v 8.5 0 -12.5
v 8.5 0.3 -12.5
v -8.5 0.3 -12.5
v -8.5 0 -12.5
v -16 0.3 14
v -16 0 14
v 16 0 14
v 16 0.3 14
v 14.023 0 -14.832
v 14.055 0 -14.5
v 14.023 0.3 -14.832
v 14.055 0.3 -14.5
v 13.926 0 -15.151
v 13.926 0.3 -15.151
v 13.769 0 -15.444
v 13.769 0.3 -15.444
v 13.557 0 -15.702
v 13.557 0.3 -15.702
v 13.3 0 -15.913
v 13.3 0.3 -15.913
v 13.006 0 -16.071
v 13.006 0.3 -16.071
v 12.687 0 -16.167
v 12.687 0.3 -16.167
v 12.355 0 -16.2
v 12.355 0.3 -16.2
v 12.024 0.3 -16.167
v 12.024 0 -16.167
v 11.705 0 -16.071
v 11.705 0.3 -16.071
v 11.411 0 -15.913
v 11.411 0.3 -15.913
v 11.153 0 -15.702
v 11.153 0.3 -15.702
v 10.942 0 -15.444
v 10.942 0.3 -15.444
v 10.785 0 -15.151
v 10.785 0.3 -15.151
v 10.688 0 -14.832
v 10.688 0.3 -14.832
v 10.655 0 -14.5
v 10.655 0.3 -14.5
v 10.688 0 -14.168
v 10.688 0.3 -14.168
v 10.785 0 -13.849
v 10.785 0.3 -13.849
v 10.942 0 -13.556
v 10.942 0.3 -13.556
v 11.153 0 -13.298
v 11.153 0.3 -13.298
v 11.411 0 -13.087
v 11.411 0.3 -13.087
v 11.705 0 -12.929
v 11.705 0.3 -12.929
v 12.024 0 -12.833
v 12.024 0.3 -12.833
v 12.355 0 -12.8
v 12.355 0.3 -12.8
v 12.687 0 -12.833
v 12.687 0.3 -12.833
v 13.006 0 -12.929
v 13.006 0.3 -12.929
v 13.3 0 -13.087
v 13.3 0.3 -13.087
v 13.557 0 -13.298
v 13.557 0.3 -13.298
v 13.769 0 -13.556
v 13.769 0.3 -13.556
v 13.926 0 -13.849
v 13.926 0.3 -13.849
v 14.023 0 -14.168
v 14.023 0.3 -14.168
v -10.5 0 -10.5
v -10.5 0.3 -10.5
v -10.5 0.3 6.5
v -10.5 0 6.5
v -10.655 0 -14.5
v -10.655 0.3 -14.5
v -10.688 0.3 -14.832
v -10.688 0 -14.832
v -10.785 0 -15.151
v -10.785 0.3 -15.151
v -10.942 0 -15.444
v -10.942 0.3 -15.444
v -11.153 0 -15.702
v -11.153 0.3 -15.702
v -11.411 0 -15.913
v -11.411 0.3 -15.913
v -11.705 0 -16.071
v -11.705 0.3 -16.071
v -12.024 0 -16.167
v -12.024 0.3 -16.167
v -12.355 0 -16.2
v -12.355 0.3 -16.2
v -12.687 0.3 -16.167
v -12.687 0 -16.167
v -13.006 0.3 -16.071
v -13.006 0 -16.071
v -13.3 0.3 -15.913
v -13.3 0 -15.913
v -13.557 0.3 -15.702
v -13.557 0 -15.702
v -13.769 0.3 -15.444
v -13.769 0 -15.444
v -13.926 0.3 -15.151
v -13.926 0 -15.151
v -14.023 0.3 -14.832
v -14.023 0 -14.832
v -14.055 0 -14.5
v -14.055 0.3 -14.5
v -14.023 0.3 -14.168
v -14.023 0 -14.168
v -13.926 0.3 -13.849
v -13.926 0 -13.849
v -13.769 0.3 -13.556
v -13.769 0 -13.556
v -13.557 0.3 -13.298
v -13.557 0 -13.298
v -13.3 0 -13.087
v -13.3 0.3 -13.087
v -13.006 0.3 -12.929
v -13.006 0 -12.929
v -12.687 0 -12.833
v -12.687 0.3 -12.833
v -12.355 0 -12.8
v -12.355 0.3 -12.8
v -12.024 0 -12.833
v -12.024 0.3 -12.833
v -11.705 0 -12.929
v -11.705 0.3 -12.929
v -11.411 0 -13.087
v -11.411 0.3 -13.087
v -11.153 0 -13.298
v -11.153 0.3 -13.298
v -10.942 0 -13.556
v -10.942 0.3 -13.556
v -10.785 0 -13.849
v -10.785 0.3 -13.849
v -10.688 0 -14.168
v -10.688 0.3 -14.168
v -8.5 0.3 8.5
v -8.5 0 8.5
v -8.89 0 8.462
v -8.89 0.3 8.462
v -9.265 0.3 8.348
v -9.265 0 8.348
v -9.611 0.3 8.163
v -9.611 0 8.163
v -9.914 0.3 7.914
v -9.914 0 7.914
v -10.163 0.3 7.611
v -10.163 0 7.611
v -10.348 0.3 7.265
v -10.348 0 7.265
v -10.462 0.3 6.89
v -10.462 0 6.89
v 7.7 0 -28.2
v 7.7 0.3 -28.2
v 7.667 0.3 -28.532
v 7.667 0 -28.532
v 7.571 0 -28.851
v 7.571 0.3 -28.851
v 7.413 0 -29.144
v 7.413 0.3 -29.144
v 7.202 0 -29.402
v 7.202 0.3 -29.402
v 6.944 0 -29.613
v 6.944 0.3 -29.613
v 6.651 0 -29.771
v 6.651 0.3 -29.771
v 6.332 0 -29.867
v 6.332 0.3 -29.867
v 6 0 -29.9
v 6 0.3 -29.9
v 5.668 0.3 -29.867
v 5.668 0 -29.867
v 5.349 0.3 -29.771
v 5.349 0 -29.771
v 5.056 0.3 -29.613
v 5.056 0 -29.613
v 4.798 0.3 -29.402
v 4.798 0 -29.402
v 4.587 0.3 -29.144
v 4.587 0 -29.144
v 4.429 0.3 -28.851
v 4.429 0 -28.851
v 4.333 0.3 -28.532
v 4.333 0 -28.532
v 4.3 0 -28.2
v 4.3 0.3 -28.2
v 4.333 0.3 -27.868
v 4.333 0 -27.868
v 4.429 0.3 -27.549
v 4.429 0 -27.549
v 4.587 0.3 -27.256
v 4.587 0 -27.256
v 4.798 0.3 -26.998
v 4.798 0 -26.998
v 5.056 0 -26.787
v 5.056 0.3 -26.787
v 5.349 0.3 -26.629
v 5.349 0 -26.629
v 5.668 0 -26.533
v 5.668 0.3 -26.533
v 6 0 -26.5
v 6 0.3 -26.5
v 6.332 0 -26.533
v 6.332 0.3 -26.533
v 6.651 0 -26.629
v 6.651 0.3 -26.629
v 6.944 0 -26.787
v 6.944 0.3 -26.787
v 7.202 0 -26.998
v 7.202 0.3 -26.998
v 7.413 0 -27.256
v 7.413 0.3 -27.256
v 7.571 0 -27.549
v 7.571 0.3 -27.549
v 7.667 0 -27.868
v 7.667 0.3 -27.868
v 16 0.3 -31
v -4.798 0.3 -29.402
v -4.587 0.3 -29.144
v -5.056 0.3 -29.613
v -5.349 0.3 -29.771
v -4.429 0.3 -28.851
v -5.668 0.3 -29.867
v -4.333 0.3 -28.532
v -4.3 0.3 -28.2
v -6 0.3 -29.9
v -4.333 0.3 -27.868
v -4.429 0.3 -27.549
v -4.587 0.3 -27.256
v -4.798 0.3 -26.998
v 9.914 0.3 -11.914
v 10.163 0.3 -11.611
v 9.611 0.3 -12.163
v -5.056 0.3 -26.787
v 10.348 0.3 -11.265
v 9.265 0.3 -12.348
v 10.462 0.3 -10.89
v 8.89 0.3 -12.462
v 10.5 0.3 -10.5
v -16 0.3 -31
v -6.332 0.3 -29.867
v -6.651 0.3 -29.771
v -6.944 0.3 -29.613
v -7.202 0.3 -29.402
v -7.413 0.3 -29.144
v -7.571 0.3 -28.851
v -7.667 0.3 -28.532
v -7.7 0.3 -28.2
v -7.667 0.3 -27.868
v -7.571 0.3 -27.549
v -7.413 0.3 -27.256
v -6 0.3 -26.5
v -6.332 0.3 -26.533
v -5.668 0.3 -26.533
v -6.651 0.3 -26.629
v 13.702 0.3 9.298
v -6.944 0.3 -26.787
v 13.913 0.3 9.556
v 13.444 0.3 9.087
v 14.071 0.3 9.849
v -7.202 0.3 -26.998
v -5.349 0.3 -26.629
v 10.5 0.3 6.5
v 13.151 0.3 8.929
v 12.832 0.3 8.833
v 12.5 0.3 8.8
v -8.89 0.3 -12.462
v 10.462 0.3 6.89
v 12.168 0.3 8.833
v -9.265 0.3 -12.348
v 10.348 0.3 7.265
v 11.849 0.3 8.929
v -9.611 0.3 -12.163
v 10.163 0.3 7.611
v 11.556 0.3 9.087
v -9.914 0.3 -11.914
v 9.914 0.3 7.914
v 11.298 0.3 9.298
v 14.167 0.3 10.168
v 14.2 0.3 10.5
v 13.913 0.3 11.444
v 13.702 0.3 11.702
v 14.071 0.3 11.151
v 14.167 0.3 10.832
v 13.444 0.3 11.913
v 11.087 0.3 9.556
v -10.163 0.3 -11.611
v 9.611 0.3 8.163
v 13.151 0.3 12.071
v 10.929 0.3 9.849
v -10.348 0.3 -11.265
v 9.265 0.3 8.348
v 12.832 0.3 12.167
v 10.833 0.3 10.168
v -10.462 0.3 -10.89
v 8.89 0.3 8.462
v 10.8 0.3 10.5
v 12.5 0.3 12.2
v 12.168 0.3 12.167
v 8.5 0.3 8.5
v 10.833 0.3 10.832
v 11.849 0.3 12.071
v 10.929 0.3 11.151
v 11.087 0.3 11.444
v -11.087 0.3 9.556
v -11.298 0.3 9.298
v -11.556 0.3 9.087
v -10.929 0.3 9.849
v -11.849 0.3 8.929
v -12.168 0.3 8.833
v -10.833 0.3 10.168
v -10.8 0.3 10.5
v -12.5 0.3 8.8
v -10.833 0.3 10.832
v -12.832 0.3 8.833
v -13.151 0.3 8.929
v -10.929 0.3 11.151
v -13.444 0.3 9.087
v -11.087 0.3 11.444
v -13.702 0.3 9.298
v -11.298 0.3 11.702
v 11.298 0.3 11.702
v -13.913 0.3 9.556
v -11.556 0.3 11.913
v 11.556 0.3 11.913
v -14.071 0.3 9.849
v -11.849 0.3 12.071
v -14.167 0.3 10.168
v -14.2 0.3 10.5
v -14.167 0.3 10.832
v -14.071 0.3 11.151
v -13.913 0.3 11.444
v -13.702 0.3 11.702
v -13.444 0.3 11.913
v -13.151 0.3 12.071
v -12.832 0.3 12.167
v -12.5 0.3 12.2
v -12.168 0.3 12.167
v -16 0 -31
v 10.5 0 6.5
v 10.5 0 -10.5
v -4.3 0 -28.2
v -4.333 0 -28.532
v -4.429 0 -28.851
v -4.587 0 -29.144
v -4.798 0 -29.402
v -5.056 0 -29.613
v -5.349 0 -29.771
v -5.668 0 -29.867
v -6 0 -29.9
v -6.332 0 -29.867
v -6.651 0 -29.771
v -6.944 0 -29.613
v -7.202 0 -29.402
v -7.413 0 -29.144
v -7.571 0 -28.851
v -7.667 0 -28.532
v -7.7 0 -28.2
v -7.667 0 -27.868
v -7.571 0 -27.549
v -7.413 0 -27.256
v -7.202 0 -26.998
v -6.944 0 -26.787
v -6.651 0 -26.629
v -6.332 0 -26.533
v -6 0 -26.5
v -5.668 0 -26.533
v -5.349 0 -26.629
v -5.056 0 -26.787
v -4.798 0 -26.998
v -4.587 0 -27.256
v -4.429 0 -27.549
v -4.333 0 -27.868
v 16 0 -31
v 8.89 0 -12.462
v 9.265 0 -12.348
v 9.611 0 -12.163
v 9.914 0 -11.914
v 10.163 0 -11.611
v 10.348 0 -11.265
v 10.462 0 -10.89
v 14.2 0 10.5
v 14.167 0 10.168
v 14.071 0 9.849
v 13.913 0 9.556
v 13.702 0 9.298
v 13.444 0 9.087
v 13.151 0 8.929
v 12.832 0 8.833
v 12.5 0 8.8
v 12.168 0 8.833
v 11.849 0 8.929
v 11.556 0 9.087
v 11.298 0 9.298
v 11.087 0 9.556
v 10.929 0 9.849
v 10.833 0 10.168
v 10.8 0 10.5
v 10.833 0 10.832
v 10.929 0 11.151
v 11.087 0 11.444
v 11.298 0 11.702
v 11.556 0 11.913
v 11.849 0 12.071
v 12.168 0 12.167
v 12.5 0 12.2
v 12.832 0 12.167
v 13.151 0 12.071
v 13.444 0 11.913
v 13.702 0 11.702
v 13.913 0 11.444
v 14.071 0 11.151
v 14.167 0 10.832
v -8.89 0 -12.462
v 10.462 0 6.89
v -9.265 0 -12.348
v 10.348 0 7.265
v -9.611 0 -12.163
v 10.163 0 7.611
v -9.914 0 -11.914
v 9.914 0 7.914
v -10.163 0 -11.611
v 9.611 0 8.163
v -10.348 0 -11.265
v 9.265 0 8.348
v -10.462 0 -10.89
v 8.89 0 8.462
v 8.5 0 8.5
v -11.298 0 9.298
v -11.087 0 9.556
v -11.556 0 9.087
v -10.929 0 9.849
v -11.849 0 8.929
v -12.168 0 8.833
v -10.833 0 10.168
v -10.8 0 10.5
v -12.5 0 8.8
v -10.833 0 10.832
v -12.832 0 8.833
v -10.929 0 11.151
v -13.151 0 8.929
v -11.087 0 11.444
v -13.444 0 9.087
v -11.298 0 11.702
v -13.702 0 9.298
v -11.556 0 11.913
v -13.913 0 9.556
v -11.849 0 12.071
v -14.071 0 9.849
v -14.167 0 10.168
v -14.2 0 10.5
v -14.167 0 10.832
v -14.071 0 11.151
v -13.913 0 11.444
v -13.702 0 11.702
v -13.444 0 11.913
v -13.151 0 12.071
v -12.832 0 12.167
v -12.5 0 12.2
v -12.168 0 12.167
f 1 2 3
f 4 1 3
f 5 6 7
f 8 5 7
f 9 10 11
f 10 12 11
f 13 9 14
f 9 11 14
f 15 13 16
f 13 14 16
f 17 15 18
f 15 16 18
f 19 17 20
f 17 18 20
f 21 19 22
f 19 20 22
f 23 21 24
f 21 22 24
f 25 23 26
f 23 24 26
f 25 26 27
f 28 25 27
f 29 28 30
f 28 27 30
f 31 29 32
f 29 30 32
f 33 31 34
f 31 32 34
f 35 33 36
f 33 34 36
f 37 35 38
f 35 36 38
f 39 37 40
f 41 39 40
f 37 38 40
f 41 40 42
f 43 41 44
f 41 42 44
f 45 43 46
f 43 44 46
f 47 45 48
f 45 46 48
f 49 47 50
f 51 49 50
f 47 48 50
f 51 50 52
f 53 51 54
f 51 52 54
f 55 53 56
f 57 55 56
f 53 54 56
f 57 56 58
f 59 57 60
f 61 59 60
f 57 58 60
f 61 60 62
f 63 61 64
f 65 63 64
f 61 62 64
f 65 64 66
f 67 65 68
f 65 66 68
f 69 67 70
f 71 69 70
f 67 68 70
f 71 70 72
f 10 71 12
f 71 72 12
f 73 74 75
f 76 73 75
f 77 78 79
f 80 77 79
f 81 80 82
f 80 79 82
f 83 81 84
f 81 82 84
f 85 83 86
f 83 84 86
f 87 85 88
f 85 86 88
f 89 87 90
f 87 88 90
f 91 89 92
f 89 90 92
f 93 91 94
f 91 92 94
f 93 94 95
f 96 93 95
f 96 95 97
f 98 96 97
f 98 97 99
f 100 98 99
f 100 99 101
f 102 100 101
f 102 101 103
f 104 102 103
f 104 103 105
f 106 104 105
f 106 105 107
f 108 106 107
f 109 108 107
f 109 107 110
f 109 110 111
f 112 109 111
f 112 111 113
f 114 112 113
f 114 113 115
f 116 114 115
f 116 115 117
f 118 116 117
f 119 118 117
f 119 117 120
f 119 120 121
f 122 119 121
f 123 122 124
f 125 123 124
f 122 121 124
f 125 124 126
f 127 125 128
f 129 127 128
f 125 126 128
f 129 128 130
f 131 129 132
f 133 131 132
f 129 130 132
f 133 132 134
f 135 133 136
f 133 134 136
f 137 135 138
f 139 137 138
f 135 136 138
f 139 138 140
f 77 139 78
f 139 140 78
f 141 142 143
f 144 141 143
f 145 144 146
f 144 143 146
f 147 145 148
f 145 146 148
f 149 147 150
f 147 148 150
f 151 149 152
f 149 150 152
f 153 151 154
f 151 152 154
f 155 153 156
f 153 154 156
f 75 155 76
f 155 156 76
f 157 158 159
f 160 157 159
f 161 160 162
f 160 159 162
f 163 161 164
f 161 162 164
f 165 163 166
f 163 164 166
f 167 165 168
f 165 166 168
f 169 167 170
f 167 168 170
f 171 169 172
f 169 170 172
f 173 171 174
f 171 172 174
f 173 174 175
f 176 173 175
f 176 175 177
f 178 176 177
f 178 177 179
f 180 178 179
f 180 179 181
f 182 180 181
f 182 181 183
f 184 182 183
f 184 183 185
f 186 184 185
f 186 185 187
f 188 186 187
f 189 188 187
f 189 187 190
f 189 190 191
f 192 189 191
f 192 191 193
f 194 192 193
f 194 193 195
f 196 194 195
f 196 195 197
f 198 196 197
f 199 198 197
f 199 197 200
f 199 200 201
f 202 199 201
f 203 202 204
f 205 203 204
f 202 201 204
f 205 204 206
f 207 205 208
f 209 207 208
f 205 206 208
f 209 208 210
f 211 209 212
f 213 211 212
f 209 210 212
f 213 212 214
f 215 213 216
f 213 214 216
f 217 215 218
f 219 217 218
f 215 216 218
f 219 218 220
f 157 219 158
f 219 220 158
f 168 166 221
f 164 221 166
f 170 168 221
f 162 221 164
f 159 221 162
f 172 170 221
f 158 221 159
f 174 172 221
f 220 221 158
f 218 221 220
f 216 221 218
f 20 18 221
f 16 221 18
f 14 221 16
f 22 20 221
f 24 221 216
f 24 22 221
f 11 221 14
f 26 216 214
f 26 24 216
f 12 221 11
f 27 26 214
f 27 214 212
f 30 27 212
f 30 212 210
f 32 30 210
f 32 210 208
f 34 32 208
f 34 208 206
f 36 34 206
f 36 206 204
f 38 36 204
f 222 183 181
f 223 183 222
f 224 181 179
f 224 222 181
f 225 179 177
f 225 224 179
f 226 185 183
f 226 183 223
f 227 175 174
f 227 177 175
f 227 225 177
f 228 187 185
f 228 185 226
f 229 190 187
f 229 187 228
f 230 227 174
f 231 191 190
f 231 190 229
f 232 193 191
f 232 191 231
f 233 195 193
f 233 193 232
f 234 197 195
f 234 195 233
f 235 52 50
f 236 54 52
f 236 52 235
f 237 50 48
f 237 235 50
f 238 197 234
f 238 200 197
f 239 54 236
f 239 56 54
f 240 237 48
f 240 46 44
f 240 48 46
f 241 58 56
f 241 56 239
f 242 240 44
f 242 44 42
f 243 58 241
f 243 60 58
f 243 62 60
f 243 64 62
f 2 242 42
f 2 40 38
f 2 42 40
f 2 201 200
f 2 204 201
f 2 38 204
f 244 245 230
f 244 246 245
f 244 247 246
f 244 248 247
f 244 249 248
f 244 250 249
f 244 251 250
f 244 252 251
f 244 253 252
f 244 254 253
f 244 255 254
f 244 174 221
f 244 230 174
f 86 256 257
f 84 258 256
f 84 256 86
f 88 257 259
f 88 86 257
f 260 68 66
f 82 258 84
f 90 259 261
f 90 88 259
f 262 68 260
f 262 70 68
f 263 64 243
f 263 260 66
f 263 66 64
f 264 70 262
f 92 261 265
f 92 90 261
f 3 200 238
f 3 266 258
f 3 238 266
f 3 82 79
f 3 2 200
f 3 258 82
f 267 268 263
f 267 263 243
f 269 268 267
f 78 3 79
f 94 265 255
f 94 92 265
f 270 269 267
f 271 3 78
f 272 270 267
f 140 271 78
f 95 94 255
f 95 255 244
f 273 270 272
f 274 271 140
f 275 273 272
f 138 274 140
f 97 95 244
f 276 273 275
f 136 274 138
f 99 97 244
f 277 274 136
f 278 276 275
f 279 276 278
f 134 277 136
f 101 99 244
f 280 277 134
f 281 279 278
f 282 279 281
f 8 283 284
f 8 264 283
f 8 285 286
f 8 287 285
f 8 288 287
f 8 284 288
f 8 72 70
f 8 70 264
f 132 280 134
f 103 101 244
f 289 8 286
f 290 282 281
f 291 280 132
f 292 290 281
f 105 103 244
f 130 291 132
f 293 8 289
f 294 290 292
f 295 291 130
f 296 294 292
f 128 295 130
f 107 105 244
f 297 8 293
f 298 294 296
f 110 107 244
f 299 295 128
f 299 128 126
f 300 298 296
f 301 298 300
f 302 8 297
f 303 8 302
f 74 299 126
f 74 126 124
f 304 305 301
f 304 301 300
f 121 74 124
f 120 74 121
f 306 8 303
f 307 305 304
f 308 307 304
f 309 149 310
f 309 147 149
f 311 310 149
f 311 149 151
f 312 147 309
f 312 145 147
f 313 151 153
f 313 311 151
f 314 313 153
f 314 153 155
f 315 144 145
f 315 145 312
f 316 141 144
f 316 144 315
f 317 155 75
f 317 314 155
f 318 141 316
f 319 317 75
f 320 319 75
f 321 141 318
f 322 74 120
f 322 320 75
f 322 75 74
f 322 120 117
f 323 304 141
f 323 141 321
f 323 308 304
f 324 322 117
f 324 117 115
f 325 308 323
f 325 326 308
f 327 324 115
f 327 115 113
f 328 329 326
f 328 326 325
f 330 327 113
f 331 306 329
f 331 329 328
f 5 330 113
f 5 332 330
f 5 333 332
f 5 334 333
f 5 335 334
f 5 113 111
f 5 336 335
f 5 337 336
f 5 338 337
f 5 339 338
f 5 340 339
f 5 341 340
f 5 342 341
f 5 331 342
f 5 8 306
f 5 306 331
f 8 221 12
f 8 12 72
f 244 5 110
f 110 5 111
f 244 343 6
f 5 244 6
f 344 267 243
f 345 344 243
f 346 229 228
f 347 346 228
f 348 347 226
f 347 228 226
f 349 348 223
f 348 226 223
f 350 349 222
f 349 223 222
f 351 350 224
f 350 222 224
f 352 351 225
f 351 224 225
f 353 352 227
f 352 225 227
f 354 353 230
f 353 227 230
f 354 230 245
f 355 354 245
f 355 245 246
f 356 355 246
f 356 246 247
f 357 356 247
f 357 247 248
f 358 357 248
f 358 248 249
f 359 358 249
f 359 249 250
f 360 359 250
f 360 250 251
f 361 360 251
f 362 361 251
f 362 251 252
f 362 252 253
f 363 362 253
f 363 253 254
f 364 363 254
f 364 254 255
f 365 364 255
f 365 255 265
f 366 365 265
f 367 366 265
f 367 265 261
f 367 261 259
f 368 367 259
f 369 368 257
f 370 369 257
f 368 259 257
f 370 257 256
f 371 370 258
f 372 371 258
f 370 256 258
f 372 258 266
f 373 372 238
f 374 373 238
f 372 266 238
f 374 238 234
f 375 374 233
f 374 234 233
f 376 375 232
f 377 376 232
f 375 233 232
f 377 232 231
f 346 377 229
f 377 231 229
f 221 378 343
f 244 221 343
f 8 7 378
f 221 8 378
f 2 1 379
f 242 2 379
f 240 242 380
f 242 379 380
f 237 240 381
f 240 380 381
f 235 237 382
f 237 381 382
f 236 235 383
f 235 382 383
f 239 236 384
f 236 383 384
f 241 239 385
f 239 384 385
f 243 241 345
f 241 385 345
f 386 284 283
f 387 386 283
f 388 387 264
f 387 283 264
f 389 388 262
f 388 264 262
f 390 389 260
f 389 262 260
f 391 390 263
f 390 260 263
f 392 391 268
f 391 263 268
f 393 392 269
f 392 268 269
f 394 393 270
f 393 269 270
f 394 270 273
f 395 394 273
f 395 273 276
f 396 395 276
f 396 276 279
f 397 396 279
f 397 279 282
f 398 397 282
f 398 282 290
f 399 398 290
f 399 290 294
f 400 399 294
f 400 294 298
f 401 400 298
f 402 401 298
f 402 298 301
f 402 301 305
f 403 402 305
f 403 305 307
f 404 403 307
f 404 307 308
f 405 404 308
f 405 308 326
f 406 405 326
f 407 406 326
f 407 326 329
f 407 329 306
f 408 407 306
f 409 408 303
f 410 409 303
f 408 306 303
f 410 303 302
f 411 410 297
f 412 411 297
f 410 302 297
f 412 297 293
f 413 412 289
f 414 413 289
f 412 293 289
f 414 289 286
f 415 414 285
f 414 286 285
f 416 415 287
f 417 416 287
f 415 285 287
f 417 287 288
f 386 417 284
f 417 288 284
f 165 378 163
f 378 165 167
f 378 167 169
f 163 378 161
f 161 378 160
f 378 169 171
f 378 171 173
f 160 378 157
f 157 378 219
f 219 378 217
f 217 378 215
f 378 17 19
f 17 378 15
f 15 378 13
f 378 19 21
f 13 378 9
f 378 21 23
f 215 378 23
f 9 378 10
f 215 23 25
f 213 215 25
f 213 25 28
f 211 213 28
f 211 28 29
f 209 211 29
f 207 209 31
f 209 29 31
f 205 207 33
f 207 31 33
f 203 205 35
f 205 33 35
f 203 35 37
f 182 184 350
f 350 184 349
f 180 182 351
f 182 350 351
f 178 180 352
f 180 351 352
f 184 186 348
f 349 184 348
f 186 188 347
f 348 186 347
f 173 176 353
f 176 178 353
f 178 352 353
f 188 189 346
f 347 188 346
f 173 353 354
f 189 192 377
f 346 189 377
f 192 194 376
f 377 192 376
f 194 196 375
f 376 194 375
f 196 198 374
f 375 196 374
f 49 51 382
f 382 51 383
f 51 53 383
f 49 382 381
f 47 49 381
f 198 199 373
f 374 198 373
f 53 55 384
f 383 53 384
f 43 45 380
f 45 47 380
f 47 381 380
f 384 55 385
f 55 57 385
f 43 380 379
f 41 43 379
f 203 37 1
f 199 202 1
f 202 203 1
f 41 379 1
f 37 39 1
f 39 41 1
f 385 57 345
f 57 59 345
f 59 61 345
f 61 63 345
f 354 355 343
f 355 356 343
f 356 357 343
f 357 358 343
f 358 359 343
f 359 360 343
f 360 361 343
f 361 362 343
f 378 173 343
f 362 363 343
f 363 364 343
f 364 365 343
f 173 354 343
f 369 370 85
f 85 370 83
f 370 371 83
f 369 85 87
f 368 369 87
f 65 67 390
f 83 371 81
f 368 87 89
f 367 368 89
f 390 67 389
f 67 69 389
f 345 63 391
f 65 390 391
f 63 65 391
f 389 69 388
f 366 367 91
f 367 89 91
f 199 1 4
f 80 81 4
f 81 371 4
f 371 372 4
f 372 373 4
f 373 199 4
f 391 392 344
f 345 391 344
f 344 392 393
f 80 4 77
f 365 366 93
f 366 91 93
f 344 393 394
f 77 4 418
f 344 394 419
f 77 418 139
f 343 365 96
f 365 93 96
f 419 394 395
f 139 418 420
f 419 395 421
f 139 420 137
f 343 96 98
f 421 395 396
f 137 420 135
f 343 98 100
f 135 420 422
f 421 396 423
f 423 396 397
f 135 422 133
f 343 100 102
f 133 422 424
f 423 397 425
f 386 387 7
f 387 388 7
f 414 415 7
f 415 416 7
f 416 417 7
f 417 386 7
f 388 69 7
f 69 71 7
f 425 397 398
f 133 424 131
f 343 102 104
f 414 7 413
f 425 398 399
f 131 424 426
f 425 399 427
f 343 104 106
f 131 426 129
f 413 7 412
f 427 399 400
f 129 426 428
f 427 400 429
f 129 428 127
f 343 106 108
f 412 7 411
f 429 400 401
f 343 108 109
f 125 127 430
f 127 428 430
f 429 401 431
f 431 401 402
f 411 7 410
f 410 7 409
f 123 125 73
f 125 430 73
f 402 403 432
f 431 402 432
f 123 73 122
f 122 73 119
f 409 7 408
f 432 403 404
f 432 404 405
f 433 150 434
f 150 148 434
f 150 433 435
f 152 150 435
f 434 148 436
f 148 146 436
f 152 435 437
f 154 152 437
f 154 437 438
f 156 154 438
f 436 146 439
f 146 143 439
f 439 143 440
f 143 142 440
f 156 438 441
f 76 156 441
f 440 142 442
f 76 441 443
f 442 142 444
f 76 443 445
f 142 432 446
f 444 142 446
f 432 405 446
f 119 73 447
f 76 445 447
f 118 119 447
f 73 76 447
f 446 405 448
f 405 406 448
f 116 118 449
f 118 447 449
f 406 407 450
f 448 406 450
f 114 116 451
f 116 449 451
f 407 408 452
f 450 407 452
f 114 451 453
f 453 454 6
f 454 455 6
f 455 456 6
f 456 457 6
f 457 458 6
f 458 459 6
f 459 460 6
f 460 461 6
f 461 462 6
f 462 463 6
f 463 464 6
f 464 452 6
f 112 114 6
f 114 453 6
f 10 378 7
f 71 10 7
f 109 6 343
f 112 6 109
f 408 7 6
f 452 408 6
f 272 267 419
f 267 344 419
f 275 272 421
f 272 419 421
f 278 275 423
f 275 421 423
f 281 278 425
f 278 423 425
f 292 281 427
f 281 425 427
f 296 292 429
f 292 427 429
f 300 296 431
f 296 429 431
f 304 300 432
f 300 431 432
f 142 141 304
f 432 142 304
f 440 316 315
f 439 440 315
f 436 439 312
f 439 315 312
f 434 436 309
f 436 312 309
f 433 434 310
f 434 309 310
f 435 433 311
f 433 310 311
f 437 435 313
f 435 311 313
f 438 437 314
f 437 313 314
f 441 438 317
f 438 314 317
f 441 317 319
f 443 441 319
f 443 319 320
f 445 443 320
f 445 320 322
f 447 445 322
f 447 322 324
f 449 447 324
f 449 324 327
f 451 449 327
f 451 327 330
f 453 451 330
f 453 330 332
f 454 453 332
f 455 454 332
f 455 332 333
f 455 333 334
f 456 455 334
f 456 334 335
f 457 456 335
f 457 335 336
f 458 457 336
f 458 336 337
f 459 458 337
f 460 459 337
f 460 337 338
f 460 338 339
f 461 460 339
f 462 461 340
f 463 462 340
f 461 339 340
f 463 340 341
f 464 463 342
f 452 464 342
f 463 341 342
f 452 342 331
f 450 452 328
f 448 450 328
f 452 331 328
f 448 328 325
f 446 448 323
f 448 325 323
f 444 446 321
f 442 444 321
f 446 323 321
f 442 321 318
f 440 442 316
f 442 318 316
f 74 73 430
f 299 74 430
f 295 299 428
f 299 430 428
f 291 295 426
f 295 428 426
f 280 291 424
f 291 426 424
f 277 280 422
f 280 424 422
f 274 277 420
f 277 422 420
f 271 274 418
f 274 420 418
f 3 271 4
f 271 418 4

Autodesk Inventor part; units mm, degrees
ref_plane "YZ Plane" through (0, 0, 0) normal (1, 0, 0) x (0, 1, 0)
ref_plane "XZ Plane" through (0, 0, 0) normal (0, 1, 0) x (-1, 0, 0)
ref_plane "XY Plane" through (0, 0, 0) normal (0, 0, 1) x (1, 0, 0)
sketch "スケッチ1" plane through (0, 0, 0) normal (0, 1, 0) x (-1, 0, 0)
  line L0 (16, -31) -> (16, 14)
  line L1 (16, 14) -> (-16, 14)
  line L2 (-16, 14) -> (-16, -31)
  line L3 (-16, -31) -> (16, -31)
  line L4 (0, 0) -> (0, -32.6995) construction
  point P0 (0, 14)
  dimension "d0" = 45
  dimension "d1" = 32
  dimension "d2" = 14
extrude "押し出し1" add sketch "スケッチ1" along normal blind 0.3
sketch "スケッチ4" plane through (0, 0.3, 0) normal (0, 1, 0) x (1, 0, 0)
  line L0 (0, 0) -> (-18.7084, 0) construction
  circle A0 centre (-6, 28.2) radius 1.7
  circle A1 centre (6, 28.2) radius 1.7
  line L1 (0, 0) -> (0, 29.6633) construction
  line L2 (16, 31) -> (-16, 31) projected
  point P0 (0, 31)
  dimension "d35" = 3.4
  dimension "d36" = 3.4
  dimension "d37" = 6
  dimension "d38" = 2.8
extrude "押し出し3" cut sketch "スケッチ4" against normal through all
sketch "スケッチ7" plane through (0, 0.3, 0) normal (0, 1, 0) x (1, 0, 0)
  circle A0 centre (-12.5, -10.5) radius 1.7
  circle A1 centre (12.5, -10.5) radius 1.7
  circle A2 centre (12.3554, 14.5) radius 1.7
  circle A3 centre (-12.3554, 14.5) radius 1.7
  line L0 (0, 0) -> (0, 34.4459) construction
  point P0 (-16, -14)
  dimension "d47" = 3.4
  dimension "d48" = 3.4
  dimension "d49" = 3.4
  dimension "d50" = 3.4
  dimension "d51" = 25
  dimension "d52" = 25
  dimension "d55" = 3.5
extrude "押し出し6" cut sketch "スケッチ7" against normal through all
sketch "スケッチ8" plane through (0, 0.3, 0) normal (0, 1, 0) x (1, 0, 0)
  line L0 (-10.5, -8.5) -> (10.5, -8.5)
  line L1 (10.5, -8.5) -> (10.5, 12.5)
  line L2 (10.5, 12.5) -> (-10.5, 12.5)
  line L3 (-10.5, 12.5) -> (-10.5, -8.5)
  line L4 (0, 0) -> (0, 16.5634) construction
  point P0 (-16, -14)
  dimension "d56" = 21
  dimension "d57" = 21
  dimension "d58" = 5.5
extrude "押し出し7" cut sketch "スケッチ8" against normal through all
fillet "フィレット1" radius 2 4 edges at (-10.5, 0.15, -12.5) (-10.5, 0.15, 8.5) (10.5, 0.15, 8.5) (10.5, 0.15, -12.5)
properties part number "B_holder_middle_muti-holes" material "ステンレス鋼 440C"
